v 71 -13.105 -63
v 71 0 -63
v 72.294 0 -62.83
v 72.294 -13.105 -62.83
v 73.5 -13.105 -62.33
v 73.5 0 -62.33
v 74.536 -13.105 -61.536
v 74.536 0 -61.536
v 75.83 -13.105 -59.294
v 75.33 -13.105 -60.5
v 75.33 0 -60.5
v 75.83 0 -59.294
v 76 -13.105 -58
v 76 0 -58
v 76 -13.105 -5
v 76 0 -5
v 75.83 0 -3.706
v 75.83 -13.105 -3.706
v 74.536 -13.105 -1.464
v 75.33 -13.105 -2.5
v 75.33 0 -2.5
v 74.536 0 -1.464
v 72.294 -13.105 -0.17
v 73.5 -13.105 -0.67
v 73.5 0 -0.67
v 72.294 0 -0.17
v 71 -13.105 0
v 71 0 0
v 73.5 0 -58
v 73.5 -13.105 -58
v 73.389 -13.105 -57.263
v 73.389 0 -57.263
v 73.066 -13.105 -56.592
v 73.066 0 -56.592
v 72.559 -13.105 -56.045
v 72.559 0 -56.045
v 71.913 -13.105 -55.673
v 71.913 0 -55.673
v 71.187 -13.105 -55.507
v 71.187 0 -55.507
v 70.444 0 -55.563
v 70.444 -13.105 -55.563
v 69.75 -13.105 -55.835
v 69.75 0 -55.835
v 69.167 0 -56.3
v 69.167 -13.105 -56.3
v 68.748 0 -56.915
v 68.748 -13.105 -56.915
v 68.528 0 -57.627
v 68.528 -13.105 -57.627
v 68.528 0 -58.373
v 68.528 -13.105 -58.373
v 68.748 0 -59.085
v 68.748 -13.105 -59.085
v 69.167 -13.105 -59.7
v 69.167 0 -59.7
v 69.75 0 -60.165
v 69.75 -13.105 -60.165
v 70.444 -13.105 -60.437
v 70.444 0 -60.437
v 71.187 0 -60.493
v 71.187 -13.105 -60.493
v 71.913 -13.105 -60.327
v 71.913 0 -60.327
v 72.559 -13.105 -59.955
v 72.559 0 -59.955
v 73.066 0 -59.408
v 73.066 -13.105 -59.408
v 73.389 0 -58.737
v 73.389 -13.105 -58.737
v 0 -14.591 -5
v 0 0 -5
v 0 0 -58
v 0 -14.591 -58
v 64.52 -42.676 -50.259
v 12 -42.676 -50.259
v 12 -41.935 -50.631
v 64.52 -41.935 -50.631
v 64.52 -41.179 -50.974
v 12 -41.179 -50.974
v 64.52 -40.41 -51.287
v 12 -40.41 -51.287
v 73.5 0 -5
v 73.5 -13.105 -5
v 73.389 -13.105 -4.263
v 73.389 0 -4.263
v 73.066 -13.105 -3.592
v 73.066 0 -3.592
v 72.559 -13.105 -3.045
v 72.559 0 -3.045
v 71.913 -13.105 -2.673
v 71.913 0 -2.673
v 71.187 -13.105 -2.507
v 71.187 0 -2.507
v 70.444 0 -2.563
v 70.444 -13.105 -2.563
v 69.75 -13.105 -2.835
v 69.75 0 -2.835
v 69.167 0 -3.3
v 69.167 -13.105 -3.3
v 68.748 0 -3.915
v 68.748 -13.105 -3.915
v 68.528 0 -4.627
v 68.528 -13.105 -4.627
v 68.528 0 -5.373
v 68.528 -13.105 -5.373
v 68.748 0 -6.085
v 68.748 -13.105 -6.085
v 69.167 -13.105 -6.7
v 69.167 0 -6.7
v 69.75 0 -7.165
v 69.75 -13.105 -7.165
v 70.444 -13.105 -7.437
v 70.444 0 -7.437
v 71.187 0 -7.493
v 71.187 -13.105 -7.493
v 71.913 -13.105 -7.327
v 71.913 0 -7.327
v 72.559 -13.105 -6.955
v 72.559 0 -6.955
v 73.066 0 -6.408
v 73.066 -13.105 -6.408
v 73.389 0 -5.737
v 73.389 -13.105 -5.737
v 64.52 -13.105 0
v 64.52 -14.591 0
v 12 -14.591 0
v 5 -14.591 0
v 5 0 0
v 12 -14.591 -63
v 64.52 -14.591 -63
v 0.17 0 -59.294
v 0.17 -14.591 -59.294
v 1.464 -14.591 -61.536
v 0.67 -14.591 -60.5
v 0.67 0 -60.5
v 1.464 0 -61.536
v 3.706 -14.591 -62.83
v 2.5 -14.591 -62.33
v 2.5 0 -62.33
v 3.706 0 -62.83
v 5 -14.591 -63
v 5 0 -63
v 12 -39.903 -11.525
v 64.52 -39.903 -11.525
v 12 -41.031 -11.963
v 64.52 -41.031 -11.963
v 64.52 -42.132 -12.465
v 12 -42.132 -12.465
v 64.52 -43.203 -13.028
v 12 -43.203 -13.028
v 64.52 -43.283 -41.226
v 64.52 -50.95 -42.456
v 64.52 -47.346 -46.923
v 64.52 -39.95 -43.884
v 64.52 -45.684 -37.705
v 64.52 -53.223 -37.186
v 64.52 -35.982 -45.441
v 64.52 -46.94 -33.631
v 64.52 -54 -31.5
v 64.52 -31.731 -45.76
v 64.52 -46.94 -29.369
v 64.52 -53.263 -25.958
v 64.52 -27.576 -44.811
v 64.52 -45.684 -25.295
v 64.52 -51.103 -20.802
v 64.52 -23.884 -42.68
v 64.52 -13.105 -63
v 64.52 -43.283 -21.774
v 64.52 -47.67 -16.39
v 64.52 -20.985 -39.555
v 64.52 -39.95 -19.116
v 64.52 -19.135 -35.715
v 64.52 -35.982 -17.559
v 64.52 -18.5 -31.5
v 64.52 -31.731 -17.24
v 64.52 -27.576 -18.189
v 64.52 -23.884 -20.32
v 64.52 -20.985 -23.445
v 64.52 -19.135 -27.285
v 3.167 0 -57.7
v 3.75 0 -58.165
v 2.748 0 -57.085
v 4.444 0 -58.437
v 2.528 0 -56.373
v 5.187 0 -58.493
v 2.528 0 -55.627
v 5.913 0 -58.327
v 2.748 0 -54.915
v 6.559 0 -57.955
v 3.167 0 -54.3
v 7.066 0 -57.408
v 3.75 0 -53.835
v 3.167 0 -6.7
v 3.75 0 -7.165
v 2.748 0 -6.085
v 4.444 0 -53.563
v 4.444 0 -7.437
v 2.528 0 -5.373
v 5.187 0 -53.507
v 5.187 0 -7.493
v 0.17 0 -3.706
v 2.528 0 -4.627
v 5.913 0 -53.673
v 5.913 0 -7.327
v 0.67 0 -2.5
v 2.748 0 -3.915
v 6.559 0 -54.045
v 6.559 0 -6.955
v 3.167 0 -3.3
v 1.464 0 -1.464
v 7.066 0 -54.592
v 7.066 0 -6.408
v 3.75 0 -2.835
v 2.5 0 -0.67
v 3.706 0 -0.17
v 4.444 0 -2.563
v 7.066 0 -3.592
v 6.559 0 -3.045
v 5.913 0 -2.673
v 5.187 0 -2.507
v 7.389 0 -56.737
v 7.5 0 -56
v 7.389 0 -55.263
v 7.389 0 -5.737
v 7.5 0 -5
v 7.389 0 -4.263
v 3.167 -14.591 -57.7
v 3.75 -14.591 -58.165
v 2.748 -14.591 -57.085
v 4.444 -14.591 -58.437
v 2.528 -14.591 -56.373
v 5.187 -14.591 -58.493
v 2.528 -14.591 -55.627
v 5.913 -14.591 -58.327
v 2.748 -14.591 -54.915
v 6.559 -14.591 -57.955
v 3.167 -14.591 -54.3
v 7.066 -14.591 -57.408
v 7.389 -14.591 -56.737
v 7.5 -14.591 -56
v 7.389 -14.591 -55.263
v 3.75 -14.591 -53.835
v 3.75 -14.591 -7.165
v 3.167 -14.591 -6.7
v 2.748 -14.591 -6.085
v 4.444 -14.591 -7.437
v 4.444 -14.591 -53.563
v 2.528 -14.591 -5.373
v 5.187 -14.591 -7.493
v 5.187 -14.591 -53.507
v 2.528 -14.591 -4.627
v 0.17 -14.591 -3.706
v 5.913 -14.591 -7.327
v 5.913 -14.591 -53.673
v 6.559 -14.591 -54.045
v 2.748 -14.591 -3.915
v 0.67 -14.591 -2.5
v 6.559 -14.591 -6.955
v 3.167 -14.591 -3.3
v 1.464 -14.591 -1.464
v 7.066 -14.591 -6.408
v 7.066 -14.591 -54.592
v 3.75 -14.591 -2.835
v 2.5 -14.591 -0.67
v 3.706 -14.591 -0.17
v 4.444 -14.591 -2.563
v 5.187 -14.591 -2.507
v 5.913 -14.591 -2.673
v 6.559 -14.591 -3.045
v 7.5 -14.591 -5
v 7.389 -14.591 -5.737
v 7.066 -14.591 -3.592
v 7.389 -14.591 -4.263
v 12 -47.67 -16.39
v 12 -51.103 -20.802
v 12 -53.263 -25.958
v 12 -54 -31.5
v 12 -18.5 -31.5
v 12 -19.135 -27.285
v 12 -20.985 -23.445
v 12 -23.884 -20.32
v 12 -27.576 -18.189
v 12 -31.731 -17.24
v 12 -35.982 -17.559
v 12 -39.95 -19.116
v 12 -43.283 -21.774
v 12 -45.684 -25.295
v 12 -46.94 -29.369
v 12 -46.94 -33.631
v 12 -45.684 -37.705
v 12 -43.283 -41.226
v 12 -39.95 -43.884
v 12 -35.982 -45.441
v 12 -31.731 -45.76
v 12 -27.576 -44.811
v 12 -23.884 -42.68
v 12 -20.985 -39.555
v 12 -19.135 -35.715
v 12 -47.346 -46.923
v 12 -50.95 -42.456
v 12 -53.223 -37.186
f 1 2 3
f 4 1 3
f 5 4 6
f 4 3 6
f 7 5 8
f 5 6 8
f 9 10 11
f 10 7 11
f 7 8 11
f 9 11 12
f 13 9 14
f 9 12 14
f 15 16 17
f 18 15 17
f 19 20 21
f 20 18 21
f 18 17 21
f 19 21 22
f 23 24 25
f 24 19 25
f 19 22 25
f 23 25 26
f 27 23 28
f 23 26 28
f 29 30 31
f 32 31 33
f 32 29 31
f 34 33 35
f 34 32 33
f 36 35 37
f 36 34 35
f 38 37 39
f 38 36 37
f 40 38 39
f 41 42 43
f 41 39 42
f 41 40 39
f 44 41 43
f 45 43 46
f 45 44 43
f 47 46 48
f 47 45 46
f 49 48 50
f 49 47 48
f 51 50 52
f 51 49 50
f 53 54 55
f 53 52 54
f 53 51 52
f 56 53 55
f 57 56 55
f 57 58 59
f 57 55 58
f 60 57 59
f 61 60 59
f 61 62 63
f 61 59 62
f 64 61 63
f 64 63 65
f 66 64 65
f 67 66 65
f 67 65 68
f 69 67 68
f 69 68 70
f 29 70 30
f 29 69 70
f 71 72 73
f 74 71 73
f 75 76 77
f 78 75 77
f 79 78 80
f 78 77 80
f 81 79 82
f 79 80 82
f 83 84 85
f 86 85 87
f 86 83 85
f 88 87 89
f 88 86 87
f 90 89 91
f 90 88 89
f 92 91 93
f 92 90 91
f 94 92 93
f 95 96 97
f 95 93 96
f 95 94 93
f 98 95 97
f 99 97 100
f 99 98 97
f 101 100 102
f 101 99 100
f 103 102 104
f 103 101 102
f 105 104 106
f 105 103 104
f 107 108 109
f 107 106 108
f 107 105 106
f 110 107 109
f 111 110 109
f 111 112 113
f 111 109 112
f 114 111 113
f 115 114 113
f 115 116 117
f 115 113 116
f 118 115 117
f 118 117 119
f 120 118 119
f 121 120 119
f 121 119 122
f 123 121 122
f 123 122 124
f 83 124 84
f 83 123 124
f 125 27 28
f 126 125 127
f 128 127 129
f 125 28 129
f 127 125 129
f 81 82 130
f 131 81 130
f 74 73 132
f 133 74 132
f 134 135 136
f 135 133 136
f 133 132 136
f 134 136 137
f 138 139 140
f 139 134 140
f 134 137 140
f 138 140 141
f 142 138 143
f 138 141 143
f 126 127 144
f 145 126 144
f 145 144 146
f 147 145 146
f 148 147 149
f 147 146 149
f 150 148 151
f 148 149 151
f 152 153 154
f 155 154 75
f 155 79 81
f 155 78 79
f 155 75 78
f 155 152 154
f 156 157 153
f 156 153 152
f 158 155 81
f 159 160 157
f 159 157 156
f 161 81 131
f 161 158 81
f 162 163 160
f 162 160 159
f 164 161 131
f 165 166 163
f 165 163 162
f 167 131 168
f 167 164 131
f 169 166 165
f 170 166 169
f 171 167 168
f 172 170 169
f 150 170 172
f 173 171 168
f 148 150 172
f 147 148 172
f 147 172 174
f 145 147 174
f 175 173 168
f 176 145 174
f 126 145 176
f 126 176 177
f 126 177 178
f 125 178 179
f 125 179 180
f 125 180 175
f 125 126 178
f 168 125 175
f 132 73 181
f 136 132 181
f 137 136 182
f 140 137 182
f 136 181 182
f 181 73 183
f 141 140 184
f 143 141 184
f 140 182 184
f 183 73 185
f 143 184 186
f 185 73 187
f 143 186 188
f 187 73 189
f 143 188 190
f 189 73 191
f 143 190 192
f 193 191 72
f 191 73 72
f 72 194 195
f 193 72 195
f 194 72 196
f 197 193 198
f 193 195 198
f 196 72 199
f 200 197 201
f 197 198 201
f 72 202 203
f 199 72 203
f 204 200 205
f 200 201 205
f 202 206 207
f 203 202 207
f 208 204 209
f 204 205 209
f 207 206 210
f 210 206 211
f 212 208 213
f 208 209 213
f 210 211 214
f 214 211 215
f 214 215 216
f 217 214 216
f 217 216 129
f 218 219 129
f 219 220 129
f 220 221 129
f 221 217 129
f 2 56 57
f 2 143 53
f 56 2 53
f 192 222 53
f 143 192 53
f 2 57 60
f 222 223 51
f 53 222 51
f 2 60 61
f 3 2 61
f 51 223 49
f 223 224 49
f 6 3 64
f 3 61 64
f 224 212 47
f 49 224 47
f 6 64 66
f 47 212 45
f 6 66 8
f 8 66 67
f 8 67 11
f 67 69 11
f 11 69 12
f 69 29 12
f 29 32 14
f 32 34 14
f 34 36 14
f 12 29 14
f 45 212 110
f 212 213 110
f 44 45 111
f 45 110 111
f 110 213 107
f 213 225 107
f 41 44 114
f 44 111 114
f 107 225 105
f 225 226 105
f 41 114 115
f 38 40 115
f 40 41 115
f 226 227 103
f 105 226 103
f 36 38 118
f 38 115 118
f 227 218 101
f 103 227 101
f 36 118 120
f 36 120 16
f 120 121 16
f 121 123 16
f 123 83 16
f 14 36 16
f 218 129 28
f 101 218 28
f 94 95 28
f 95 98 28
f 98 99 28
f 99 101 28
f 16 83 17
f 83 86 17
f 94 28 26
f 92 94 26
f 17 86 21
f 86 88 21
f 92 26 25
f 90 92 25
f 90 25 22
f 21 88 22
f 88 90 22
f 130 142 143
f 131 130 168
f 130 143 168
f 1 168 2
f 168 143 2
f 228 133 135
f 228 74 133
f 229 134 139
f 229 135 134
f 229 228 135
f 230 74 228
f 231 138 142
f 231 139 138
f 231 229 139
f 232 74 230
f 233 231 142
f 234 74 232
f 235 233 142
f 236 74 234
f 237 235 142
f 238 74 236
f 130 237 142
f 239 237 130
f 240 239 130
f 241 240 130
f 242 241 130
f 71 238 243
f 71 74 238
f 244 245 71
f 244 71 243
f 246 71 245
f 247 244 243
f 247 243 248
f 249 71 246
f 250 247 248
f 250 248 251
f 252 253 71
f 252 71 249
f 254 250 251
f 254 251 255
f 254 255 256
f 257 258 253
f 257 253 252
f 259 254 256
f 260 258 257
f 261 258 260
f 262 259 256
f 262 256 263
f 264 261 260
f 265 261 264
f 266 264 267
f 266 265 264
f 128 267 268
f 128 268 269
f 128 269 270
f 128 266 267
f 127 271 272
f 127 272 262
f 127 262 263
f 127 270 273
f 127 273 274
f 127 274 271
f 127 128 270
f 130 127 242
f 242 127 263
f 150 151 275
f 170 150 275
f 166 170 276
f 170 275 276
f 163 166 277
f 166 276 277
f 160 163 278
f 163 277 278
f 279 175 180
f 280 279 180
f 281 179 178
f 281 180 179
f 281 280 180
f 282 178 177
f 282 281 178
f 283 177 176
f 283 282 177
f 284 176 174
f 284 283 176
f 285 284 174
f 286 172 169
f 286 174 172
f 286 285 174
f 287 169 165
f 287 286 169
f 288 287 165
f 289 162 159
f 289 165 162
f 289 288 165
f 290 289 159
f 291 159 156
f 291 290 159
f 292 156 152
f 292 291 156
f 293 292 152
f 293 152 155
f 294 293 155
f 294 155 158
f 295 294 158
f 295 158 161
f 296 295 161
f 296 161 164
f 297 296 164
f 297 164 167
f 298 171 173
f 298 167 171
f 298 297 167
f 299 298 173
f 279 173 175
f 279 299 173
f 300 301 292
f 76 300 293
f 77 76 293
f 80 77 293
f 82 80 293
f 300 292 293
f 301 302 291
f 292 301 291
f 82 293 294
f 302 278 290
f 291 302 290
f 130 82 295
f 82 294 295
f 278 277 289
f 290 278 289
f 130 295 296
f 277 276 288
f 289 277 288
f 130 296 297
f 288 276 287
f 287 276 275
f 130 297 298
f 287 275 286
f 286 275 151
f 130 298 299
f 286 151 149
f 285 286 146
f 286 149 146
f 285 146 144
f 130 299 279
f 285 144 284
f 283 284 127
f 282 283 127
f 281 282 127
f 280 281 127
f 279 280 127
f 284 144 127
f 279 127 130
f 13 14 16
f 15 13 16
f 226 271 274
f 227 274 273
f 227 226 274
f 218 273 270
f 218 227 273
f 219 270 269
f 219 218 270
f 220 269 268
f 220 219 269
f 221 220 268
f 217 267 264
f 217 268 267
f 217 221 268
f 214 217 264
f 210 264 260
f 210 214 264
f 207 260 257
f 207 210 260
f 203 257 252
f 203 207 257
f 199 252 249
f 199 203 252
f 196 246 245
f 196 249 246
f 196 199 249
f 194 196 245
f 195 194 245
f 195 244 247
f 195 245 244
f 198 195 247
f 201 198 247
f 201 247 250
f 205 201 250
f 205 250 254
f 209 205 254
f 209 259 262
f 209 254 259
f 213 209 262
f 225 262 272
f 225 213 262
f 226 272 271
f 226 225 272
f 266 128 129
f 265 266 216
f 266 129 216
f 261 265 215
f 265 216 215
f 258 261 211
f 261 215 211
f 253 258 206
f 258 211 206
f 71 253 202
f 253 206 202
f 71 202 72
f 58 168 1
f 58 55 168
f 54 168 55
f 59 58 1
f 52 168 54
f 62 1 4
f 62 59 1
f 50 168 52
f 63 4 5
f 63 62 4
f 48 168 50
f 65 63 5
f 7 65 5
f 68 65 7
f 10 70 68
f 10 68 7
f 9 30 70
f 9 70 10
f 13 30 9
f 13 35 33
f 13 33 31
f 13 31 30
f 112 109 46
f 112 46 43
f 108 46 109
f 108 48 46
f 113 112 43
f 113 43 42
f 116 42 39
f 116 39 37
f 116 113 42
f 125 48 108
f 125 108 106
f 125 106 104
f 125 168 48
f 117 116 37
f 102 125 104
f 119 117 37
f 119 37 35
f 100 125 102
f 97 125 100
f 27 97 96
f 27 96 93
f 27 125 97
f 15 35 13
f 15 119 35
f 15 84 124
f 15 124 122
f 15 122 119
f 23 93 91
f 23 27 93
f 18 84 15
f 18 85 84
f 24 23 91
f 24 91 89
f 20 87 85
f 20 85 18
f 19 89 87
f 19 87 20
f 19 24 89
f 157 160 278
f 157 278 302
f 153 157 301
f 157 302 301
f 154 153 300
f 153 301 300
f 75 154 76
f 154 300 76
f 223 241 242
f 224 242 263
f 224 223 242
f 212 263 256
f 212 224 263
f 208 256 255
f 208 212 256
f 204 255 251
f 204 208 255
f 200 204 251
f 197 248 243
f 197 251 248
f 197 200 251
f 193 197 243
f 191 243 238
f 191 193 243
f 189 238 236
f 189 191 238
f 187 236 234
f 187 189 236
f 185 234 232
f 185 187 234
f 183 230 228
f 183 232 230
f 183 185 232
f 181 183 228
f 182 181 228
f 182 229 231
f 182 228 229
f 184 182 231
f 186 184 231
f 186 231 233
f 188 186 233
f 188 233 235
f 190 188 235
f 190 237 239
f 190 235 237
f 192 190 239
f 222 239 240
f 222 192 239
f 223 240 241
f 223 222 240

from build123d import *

# Parameters (mm, degrees)
F0_R     = 2.5
F1_DEPTH = 54
F2_W     = 12
F2_H     = 40.4068064877
F2_H_2   = 41
F3_DEPTH = 65
F4_R     = 14.3
F5_DEPTH = 100
F7_DEPTH = 100


with BuildPart() as f1:
    # F0 (on Front) → F1 (new body)
    with BuildSketch(Plane.XZ):
        with BuildLine():
            Line((71, 0), (5, 0))
            ThreePointArc((5, 0), (1.4644660941, -1.4644660941), (0, -5))
            Line((0, -5), (0, -58))
            ThreePointArc((0, -58), (1.4644660941, -61.5355339059), (5, -63))
            Line((5, -63), (71, -63))
            ThreePointArc((71, -63), (74.5355339059, -61.5355339059), (76, -58))
            Line((76, -58), (76, -5))
            ThreePointArc((76, -5), (74.5355339059, -1.4644660941), (71, 0))
        make_face()
        with Locations((5, -56)):
            Circle(F0_R, mode=Mode.SUBTRACT)
        with Locations((71, -58)):
            Circle(F0_R, mode=Mode.SUBTRACT)
        with Locations((5, -5)):
            Circle(F0_R, mode=Mode.SUBTRACT)
        with Locations((71, -5)):
            Circle(F0_R, mode=Mode.SUBTRACT)
    extrude(amount=F1_DEPTH)

    # F2 (on Top) → F3 (cut)
    with BuildSketch(Plane.XY):
        with Locations((6, -34.7947494417)):
            Rectangle(F2_W, F2_H)
        with Locations((70.5197853446, -33.6052147746)):
            Rectangle(F2_W, F2_H_2)
    extrude(amount=-F3_DEPTH, mode=Mode.SUBTRACT)

    # F4 (on Right) → F5 (cut)
    with BuildSketch(Plane.YZ):
        with Locations((-32.8, -31.5)):
            Circle(F4_R)
    extrude(amount=F5_DEPTH, mode=Mode.SUBTRACT)

    # F6 (on face) → F7 (cut)
    with BuildSketch(Plane(origin=(12, 0, 0), x_dir=(0, -1, 0), z_dir=(-1, 0, 0))):
        with BuildLine():
            ThreePointArc((42.6762688153, -50.2589795641), (41.5584607083, -50.8062001963), (40.4104675325, -51.2868841392))
            Line((40.4104675325, -51.2868841392), (14.5913461978, -63))
            Line((14.5913461978, -63), (54, -63))
            Line((54, -63), (54, -31.5))
            ThreePointArc((54, -31.5), (50.9496129282, -42.4558911348), (42.6762688153, -50.2589795641))
        make_face()
        with BuildLine():
            ThreePointArc((43.2032697632, -13.0280759466), (51.1028593255, -20.8020870956), (54, -31.5))
            Line((54, -31.5), (54, 0))
            Line((54, 0), (14.5913461978, 0))
            Line((14.5913461978, 0), (39.9029121162, -11.5253000155))
            ThreePointArc((39.9029121162, -11.5253000155), (41.5852822877, -12.205990175), (43.2032697632, -13.0280759466))
        make_face()
    extrude(amount=-F7_DEPTH, mode=Mode.SUBTRACT)


solid = f1.part
